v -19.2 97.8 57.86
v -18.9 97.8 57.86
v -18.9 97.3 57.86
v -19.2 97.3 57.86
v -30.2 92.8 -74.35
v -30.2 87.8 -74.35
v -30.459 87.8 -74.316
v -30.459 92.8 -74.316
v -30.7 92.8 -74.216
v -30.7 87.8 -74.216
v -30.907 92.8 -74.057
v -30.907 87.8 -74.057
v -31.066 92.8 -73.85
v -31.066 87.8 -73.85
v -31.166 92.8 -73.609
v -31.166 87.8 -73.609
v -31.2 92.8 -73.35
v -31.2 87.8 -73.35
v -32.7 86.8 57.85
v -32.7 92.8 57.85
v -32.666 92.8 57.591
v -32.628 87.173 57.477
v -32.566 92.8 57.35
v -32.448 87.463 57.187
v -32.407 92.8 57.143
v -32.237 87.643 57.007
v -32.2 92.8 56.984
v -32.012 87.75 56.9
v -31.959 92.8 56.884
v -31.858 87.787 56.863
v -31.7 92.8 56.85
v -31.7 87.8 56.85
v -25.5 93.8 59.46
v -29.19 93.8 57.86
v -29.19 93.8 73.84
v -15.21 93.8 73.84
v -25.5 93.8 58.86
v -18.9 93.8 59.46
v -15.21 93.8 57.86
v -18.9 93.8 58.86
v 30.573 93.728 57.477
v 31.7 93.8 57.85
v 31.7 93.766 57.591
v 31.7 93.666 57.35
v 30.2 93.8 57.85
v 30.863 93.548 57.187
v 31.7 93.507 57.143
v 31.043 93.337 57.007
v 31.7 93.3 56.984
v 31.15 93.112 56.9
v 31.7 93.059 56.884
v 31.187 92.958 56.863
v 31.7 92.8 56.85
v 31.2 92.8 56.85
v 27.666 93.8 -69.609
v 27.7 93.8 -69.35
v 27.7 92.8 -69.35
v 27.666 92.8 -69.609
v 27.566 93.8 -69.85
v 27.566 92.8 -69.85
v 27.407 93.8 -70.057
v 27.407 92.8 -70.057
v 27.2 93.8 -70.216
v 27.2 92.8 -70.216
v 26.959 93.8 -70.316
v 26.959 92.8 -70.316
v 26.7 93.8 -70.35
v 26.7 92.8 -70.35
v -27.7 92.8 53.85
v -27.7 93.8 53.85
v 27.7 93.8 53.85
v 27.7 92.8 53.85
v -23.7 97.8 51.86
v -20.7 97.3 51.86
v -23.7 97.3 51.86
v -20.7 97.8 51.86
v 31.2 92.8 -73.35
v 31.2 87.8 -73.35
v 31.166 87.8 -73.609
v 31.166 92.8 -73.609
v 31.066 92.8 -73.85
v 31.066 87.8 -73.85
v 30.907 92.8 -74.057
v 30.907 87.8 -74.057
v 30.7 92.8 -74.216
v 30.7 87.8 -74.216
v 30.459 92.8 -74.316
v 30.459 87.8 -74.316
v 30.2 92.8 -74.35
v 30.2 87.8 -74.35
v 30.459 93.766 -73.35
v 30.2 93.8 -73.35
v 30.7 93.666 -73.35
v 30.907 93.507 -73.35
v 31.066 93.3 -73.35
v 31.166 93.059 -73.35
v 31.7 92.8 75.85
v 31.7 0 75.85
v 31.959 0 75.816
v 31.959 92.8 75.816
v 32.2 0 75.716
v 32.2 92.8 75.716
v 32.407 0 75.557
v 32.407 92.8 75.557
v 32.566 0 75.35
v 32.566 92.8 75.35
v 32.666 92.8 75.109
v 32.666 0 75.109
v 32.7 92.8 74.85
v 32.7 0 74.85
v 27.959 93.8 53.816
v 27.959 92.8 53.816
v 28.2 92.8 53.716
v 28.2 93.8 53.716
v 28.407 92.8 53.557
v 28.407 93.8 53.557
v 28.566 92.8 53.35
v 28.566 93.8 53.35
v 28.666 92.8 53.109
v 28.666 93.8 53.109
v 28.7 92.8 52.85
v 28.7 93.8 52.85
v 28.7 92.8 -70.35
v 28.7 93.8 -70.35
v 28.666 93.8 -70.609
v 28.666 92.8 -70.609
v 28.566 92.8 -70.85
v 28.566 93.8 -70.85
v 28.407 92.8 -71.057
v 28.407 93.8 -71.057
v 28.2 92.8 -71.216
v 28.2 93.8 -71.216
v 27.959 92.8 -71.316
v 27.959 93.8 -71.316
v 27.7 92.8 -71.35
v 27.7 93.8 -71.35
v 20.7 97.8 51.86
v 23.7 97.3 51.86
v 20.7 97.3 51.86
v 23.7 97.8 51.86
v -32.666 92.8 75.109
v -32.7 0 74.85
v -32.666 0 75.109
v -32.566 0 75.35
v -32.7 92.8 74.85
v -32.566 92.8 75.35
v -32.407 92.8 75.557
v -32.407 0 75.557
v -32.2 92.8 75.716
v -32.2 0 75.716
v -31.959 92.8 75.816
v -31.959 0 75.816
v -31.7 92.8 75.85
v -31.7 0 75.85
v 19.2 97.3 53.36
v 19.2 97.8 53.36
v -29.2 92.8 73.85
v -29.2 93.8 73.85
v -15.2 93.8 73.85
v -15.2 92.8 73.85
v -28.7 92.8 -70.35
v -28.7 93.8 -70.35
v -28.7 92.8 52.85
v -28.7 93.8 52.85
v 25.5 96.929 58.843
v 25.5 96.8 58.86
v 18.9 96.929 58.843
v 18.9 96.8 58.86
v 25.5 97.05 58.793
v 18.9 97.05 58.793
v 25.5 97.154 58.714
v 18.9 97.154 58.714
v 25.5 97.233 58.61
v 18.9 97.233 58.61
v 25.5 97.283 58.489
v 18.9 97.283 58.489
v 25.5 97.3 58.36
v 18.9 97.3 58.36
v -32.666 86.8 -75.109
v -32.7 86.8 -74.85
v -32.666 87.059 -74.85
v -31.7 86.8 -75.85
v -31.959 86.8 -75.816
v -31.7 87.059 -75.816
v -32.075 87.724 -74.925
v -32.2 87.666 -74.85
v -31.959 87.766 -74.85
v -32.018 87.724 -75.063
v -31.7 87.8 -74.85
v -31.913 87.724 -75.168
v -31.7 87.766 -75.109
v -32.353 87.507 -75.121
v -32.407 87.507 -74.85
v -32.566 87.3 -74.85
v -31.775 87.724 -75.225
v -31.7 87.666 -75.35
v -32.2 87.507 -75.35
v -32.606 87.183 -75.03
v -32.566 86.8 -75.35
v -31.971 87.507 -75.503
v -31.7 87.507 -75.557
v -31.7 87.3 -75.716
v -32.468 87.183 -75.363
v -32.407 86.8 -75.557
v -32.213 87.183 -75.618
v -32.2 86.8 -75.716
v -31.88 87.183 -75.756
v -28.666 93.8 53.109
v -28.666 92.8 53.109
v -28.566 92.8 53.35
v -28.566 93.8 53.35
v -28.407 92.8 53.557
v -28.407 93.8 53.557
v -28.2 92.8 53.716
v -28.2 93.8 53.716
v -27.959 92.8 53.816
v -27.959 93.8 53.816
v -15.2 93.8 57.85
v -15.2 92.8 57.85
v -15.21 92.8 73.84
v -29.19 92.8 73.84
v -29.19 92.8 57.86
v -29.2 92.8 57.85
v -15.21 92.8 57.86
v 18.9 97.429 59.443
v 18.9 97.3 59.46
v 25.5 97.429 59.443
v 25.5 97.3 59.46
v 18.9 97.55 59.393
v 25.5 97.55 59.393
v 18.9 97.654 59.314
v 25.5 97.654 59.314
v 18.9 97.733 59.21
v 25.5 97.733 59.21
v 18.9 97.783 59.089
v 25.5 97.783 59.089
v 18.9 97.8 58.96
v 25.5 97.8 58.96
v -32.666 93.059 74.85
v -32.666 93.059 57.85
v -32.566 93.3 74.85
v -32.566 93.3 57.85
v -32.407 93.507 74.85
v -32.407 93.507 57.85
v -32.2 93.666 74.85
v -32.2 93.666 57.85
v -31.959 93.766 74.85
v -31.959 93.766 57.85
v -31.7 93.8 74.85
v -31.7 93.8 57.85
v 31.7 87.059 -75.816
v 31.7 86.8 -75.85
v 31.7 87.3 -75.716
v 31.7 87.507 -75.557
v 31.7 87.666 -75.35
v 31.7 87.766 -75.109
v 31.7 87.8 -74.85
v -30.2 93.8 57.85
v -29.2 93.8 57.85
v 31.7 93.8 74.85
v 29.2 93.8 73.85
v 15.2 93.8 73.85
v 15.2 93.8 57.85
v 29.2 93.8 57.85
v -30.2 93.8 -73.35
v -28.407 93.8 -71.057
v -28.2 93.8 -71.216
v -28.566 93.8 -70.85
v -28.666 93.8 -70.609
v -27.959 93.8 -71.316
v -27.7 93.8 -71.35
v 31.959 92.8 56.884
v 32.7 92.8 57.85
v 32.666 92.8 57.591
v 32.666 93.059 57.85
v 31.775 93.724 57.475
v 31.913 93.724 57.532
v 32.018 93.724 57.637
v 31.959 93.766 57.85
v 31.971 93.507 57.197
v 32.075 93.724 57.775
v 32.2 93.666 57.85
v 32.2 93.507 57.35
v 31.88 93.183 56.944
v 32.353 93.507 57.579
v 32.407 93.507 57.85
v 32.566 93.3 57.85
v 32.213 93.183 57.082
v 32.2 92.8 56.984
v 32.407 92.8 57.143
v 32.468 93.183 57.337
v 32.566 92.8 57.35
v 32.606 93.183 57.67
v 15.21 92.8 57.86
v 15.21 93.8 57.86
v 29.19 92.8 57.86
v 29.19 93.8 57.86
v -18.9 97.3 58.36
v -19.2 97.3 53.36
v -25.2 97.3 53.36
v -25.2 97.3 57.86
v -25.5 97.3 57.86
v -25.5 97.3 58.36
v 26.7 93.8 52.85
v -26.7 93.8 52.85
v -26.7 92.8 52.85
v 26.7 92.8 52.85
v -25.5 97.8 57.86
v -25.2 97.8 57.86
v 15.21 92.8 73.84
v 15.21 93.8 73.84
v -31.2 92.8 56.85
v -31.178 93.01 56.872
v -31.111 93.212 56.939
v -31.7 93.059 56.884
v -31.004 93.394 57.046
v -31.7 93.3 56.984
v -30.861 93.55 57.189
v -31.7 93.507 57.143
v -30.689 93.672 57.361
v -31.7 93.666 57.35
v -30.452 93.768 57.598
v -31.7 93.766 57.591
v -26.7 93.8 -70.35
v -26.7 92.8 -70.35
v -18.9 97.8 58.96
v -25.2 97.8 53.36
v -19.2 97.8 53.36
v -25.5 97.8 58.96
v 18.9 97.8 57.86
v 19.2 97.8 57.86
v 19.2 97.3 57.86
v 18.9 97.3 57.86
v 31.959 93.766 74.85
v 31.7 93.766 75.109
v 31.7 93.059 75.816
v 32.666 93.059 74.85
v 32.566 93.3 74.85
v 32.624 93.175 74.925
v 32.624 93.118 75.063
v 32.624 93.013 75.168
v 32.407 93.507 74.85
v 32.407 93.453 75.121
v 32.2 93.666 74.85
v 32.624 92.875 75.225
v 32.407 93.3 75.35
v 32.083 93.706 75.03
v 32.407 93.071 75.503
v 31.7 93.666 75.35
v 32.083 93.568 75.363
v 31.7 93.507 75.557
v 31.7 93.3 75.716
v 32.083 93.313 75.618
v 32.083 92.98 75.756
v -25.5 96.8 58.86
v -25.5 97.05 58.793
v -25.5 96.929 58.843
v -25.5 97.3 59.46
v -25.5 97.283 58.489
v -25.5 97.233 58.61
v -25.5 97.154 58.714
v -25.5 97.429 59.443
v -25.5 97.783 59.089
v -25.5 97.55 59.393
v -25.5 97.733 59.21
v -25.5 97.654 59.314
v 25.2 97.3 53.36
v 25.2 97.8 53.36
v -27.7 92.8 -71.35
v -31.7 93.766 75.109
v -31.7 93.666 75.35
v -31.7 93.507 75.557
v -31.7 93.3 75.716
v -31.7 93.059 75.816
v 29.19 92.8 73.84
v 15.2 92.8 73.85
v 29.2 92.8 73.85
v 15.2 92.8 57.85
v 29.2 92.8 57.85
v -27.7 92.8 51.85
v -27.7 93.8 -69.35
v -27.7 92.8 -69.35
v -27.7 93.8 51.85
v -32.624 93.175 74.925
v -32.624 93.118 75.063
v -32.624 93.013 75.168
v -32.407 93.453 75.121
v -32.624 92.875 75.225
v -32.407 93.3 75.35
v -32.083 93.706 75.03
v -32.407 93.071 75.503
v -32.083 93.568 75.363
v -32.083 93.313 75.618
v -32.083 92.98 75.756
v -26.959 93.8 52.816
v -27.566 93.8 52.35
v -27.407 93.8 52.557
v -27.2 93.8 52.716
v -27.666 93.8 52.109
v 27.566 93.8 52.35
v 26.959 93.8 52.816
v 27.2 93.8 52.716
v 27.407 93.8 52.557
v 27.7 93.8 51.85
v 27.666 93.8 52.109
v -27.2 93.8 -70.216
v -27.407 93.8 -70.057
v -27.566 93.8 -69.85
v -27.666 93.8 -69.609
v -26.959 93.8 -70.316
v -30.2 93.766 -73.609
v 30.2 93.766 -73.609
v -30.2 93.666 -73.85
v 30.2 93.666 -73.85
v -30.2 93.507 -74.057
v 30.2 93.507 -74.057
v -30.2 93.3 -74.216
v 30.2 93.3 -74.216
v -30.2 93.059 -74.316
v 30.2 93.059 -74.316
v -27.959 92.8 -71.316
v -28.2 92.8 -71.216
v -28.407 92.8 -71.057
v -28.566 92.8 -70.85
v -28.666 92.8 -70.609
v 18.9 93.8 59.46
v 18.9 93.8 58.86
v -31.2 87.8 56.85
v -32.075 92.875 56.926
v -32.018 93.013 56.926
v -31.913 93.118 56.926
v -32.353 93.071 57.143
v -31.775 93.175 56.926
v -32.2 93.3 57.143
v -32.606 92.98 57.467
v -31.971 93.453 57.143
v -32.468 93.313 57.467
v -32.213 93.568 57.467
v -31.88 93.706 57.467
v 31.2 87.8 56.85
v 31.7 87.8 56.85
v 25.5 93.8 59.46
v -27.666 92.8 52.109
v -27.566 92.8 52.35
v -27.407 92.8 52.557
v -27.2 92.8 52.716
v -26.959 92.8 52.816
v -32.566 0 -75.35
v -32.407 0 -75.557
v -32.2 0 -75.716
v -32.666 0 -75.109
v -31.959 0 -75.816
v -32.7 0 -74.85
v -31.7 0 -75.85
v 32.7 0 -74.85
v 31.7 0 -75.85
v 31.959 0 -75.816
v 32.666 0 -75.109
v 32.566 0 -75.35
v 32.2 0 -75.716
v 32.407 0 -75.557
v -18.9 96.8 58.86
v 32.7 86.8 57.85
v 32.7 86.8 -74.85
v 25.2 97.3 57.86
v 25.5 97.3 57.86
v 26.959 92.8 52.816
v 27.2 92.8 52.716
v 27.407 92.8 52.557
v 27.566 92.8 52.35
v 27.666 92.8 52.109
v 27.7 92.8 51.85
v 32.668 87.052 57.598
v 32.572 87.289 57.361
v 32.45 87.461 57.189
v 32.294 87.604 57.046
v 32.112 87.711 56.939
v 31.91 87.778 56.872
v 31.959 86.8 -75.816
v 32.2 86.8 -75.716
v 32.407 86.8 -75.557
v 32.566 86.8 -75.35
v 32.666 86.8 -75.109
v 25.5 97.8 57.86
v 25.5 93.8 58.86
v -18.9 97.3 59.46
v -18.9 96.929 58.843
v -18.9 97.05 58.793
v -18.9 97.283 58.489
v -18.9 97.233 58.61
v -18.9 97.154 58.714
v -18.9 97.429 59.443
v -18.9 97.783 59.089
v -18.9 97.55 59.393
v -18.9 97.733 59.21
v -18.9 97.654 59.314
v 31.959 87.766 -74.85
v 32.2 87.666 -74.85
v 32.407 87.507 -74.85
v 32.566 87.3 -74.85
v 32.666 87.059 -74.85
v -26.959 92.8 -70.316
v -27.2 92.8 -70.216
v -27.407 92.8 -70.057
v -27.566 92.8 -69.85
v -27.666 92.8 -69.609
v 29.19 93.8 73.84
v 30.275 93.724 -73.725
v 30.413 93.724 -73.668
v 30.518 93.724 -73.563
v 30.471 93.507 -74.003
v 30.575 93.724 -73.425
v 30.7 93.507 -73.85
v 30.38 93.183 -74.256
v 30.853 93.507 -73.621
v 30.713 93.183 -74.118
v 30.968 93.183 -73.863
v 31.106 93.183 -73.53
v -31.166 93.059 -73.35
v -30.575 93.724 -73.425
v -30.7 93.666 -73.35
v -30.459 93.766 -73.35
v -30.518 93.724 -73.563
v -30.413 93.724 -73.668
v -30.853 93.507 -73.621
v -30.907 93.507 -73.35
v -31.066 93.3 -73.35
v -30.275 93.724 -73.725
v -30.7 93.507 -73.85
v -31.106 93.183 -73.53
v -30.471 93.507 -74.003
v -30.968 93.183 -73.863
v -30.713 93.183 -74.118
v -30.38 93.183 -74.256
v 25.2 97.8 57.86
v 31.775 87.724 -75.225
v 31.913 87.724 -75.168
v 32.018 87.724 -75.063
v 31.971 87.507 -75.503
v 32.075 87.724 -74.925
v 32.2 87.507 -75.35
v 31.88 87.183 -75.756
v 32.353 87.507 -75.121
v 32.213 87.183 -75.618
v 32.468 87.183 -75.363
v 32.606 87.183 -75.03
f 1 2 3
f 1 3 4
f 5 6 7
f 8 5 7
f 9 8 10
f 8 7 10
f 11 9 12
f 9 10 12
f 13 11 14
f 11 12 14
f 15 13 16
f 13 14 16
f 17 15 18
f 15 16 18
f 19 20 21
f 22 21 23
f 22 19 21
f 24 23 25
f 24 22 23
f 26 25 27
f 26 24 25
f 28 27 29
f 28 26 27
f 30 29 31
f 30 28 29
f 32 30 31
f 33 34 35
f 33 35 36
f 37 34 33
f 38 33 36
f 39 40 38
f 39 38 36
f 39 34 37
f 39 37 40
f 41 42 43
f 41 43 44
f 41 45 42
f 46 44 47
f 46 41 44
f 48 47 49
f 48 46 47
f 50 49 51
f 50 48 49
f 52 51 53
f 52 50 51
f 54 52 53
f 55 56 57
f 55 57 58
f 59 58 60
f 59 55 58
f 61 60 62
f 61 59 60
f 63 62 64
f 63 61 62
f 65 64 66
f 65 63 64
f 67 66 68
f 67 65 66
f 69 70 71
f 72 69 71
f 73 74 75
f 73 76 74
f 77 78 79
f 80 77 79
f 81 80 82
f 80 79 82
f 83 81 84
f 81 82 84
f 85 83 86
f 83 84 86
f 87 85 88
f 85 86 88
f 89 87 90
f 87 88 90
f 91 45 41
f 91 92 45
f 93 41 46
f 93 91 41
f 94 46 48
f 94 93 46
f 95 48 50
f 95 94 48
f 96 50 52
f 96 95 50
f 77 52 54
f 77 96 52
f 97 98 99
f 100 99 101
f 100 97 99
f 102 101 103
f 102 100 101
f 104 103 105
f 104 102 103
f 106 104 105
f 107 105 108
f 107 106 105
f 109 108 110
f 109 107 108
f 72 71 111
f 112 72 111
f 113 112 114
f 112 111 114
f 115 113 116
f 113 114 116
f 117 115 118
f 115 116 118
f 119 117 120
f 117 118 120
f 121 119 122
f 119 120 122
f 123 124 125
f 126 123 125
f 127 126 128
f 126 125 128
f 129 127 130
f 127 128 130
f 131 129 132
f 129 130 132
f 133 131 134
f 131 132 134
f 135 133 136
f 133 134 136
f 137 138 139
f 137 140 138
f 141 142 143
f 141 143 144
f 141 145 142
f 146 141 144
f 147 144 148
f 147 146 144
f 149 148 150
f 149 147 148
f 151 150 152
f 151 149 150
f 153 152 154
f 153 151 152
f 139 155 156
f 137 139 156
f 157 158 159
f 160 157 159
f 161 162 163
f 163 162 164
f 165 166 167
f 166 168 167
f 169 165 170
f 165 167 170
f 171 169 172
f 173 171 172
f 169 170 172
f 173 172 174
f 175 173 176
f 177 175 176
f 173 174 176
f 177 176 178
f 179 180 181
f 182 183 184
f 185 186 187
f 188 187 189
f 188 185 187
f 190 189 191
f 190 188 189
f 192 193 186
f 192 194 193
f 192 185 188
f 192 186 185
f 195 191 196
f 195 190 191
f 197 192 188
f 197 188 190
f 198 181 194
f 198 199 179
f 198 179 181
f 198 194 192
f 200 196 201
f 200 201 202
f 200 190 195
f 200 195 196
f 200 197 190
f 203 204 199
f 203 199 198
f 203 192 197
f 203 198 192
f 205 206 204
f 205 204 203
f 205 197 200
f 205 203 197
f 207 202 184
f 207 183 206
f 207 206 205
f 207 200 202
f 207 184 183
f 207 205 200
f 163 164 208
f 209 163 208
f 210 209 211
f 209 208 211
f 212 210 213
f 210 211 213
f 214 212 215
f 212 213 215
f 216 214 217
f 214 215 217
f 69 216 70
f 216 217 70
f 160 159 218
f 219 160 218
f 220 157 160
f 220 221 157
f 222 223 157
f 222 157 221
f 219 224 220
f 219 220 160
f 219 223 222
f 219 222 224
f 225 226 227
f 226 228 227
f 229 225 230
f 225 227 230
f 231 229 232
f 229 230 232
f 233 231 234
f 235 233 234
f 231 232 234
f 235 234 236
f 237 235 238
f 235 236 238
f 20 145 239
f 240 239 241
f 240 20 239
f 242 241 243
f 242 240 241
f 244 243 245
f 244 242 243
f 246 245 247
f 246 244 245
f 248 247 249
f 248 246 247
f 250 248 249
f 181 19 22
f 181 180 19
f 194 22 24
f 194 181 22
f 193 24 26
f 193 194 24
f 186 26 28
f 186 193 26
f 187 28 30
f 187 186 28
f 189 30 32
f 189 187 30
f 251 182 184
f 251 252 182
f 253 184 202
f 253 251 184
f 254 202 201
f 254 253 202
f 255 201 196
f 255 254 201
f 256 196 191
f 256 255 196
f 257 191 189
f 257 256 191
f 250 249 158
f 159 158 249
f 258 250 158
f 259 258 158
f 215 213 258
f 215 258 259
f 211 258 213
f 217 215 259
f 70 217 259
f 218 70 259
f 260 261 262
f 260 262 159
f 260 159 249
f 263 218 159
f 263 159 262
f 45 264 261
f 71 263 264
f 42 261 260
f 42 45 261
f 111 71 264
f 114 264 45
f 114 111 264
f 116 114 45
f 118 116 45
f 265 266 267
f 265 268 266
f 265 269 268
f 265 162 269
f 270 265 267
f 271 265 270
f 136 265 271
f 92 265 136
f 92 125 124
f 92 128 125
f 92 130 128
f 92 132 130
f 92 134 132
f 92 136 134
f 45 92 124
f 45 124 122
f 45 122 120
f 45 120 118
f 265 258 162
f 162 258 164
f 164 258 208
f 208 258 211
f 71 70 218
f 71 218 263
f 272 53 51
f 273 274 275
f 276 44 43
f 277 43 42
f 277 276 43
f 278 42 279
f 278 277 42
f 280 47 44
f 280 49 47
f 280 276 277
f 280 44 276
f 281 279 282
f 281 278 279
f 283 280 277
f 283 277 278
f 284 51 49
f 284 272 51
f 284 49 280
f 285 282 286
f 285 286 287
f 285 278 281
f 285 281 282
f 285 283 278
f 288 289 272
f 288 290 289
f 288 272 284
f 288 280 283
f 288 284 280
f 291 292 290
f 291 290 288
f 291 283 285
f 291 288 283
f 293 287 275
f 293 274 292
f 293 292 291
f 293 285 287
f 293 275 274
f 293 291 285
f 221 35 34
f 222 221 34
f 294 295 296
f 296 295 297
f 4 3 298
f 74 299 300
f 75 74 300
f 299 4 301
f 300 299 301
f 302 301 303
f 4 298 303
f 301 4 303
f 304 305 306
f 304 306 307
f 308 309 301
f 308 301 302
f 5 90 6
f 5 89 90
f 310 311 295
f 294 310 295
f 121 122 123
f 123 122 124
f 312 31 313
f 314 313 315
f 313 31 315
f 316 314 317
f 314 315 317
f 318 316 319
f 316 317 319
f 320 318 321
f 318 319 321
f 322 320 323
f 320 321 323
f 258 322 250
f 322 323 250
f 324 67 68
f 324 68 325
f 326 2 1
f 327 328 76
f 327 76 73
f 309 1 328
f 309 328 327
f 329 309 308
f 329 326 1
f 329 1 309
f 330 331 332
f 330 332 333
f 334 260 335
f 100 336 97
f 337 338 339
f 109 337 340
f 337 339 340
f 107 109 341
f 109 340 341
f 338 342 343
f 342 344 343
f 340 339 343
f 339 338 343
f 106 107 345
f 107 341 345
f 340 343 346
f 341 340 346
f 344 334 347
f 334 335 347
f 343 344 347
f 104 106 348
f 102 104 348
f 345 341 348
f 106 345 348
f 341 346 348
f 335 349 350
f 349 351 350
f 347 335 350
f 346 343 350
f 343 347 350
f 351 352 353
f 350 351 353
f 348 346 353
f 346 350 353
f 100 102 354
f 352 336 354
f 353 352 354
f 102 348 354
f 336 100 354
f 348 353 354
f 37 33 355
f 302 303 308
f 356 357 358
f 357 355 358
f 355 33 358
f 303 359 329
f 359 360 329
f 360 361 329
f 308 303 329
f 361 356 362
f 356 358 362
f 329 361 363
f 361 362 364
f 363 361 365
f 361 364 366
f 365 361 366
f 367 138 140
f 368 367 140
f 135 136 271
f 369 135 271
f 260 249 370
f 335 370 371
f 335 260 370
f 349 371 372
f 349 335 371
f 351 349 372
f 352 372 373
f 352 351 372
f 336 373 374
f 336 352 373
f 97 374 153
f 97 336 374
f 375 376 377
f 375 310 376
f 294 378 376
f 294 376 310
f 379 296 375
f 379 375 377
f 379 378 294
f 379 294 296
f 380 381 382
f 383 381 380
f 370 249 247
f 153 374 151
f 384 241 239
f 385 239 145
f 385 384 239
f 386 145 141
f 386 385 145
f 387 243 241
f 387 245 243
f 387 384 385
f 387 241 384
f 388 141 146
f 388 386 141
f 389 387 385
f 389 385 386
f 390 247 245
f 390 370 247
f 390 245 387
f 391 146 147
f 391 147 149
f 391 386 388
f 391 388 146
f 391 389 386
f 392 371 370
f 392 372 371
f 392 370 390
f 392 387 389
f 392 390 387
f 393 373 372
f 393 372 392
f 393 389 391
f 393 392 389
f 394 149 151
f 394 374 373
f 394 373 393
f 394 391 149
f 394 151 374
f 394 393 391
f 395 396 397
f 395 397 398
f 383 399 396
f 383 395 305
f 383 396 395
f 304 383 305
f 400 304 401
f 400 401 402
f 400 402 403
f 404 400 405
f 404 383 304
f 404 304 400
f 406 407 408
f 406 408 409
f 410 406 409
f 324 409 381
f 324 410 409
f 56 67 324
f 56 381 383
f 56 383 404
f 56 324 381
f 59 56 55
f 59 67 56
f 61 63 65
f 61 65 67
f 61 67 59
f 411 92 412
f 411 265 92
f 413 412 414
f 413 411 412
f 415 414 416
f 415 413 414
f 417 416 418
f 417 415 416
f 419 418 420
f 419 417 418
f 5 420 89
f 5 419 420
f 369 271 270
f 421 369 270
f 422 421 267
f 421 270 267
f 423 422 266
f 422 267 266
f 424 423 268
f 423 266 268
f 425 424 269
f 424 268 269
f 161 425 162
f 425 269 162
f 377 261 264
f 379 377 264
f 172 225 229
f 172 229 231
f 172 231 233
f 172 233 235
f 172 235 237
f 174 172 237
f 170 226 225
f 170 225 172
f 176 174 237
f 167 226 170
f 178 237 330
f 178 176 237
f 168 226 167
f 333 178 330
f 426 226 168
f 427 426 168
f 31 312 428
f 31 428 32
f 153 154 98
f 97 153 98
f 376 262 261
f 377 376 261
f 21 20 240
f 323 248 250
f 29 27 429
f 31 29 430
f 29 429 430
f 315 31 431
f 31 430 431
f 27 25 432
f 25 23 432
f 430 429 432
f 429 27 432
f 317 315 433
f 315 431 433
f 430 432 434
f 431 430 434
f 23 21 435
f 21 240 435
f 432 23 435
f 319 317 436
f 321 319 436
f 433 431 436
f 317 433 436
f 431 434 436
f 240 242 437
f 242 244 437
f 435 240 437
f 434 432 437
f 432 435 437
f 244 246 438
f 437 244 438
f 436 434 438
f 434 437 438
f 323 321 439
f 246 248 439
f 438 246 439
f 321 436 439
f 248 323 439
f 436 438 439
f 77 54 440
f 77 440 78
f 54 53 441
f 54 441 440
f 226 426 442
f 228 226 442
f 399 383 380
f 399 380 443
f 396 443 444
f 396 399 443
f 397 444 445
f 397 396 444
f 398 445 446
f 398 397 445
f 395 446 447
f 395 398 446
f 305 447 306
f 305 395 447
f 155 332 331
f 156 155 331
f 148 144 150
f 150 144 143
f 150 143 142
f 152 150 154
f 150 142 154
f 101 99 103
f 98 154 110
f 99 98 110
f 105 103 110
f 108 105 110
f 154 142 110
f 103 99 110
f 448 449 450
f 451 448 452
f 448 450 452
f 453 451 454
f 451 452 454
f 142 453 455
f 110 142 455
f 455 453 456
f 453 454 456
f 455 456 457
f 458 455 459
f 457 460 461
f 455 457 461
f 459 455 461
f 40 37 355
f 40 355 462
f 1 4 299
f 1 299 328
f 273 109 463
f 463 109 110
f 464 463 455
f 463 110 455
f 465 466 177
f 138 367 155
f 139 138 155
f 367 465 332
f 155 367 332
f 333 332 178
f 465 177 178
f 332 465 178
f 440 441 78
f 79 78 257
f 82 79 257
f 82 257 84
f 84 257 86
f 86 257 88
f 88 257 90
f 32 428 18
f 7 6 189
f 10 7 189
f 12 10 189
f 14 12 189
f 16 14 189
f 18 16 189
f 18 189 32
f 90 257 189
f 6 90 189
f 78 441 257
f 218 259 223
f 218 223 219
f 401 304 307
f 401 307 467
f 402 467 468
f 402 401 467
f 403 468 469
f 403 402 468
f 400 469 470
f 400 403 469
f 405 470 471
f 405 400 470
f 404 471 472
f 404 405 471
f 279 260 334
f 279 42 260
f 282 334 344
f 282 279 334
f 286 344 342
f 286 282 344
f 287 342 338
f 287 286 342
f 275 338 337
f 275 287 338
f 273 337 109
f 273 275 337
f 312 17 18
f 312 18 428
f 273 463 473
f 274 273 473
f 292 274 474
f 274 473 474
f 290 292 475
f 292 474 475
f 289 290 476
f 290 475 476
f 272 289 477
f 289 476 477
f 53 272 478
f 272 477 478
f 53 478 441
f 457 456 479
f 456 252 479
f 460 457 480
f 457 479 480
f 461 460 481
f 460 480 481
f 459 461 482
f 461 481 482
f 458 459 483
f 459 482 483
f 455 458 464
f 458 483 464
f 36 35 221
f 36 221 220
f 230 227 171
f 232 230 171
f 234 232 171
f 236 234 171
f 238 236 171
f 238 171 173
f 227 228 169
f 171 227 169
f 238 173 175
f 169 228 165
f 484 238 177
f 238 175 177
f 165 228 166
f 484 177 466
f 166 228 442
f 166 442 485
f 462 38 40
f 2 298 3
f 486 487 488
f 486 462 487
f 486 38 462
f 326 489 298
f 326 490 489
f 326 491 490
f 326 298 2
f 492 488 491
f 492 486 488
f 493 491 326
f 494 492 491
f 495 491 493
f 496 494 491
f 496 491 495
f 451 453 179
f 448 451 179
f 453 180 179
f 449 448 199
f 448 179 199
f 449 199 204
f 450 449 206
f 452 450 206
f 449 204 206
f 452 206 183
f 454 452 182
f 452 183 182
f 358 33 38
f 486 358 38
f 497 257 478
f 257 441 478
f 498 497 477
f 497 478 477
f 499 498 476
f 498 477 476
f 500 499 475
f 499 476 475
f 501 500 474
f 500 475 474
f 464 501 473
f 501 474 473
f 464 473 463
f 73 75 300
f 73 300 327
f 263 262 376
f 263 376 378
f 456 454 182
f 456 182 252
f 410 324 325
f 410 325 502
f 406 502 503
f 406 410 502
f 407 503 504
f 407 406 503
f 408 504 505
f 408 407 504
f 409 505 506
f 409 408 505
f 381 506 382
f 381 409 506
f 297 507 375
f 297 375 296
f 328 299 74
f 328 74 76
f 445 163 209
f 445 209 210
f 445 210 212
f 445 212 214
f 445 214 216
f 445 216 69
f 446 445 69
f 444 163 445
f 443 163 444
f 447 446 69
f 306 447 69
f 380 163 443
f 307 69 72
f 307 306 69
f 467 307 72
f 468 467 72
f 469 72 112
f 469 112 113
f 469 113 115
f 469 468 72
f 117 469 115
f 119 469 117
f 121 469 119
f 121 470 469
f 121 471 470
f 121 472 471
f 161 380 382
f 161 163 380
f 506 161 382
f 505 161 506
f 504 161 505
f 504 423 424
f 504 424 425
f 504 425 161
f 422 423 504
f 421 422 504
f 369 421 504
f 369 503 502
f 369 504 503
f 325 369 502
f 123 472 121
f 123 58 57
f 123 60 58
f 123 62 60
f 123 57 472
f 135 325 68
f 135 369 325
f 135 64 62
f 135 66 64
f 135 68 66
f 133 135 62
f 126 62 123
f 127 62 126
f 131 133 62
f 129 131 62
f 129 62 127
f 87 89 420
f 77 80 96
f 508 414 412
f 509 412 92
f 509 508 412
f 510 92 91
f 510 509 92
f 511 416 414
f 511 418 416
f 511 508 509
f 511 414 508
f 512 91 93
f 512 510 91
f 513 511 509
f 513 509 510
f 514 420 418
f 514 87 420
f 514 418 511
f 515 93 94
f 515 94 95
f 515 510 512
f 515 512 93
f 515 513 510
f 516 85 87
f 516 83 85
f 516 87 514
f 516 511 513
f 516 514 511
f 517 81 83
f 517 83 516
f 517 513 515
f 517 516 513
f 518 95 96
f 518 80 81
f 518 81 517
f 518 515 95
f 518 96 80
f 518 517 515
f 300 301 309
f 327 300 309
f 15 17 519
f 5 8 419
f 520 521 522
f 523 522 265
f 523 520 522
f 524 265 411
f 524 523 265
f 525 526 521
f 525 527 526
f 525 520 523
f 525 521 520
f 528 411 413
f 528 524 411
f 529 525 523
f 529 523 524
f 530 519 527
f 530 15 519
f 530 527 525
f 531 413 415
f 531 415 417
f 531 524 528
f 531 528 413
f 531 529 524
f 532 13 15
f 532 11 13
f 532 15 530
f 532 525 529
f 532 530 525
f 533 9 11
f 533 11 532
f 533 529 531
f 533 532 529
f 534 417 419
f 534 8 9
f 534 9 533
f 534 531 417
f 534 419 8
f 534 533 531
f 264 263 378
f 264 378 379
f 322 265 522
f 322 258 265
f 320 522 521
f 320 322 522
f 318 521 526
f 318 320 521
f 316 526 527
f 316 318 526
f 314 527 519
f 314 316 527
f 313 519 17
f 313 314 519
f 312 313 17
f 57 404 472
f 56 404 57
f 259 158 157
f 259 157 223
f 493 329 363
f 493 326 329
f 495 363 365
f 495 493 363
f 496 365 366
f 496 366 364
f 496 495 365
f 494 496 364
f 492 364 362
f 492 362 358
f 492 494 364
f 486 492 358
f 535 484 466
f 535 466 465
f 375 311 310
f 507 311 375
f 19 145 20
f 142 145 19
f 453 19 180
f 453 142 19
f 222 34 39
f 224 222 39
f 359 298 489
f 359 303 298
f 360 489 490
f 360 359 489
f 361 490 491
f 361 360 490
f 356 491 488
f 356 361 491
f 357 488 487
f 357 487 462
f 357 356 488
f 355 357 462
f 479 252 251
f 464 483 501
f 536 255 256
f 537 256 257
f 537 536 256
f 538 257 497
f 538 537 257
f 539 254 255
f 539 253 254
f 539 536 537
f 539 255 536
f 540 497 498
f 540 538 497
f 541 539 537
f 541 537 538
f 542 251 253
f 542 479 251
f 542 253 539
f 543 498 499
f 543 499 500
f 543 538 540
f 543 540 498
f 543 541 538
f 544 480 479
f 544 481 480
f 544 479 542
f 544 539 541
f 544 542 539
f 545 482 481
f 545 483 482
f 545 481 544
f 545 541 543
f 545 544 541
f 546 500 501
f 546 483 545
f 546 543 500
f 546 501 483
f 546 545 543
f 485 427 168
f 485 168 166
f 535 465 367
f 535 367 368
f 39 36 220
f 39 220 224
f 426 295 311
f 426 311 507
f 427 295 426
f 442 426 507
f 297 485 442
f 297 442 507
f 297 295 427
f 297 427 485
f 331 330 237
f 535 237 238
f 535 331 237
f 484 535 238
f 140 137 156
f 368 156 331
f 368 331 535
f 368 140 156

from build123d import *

# Parameters (mm, degrees)
CROQUIS1_W              = 65.4
CROQUIS1_H              = 151.7
SALIENTE_EXTRUIR1_DEPTH = 93.8
CORTAR_EXTRUIR1_DEPTH   = 6
REDONDEO1_R             = 1
CORTAR_EXTRUIR2_DEPTH   = 1
CROQUIS4_W              = 14
CROQUIS4_H              = 16
CROQUIS4_W_2            = 13.98
CROQUIS4_H_2            = 15.98
CORTAR_EXTRUIR3_DEPTH   = 1
CROQUIS5_W              = 6.6
CROQUIS5_H              = 0.6
SALIENTE_EXTRUIR2_DEPTH = 4
CROQUIS6_W              = 6.6
CROQUIS6_H              = 0.5
SALIENTE_EXTRUIR3_DEPTH = 1
CROQUIS7_W              = 6
CROQUIS7_H              = 0.5
SALIENTE_EXTRUIR4_DEPTH = 6
REDONDEO2_R             = 0.5
CHAFL_N1_SIZE           = 1.5


with BuildPart() as part:
    # Croquis1 → Saliente-Extruir1 (new body)
    with BuildSketch(Plane(origin=(0, 0, 0), x_dir=(1, 0, 0), z_dir=(0, 1, 0))):
        Rectangle(CROQUIS1_W, CROQUIS1_H)
    extrude(amount=SALIENTE_EXTRUIR1_DEPTH)

    # Croquis2 → Cortar-Extruir1 (cut)
    with BuildSketch(Plane(origin=(0, 93.8, 0), x_dir=(1, 0, 0), z_dir=(0, 1, 0))):
        Polygon((-32.7, -56.85), (-32.7, 75.85), (32.7, 75.85), (32.7, -56.85), (31.2, -56.85), (31.2, 74.35), (-31.2, 74.35), (-31.2, -56.85), align=None)
    extrude(amount=-CORTAR_EXTRUIR1_DEPTH, mode=Mode.SUBTRACT)

    # Redondeo1
    redondeo1_edges = [part.edges().sort_by_distance(p)[0] for p in [
        (0, 93.8, 75.85),
        (-32.7, 93.8, 66.35),
        (-32.7, 43.9, -75.85),
        (32.7, 43.9, -75.85),
        (-32.7, 87.8, -9.5),
        (-32.7, 90.8, 56.85),
        (0, 87.8, -75.85),
        (32.7, 87.8, -9.5),
        (32.7, 90.8, 56.85),
        (31.2, 90.8, -74.35),
        (-31.2, 90.8, -74.35),
        (-31.95, 93.8, 56.85),
        (-31.2, 93.8, -8.75),
        (0, 93.8, -74.35),
        (31.2, 93.8, -8.75),
        (31.95, 93.8, 56.85),
        (32.7, 93.8, 66.35),
        (32.7, 46.9, 75.85),
        (-32.7, 46.9, 75.85),
    ]]
    fillet(redondeo1_edges, radius=REDONDEO1_R)

    # Croquis3 → Cortar-Extruir2 (cut)
    with BuildSketch(Plane(origin=(0, 93.8, 0), x_dir=(1, 0, 0), z_dir=(0, 1, 0))):
        with BuildLine():
            Line((-27.7, -53.85), (27.7, -53.85))
            ThreePointArc((27.7, -53.85), (28.407106781, -53.557106781), (28.7, -52.85))
            Line((28.7, -52.85), (28.7, 70.35))
            ThreePointArc((28.7, 70.35), (28.407106781, 71.057106781), (27.7, 71.35))
            Line((27.7, 71.35), (-27.7, 71.35))
            ThreePointArc((-27.7, 71.35), (-28.407106781, 71.057106781), (-28.7, 70.35))
            Line((-28.7, 70.35), (-28.7, -52.85))
            ThreePointArc((-28.7, -52.85), (-28.407106781, -53.557106781), (-27.7, -53.85))
        make_face()
        with BuildLine():
            Line((-26.7, -52.85), (26.7, -52.85))
            ThreePointArc((26.7, -52.85), (27.407106781, -52.557106781), (27.7, -51.85))
            Line((27.7, -51.85), (27.7, 69.35))
            ThreePointArc((27.7, 69.35), (27.407106781, 70.057106781), (26.7, 70.35))
            Line((26.7, 70.35), (-26.7, 70.35))
            ThreePointArc((-26.7, 70.35), (-27.407106781, 70.057106781), (-27.7, 69.35))
            Line((-27.7, 69.35), (-27.7, -51.85))
            ThreePointArc((-27.7, -51.85), (-27.407106781, -52.557106781), (-26.7, -52.85))
        make_face(mode=Mode.SUBTRACT)
    extrude(amount=-CORTAR_EXTRUIR2_DEPTH, mode=Mode.SUBTRACT)

    # Croquis4 → Cortar-Extruir3 (cut)
    # profile 1 of 2: a face of its own
    with BuildSketch(Plane(origin=(0, 93.8, 0), x_dir=(1, 0, 0), z_dir=(0, 1, 0))):
        with Locations((-22.2, -65.85)):
            Rectangle(CROQUIS4_W, CROQUIS4_H)
        with Locations((-22.2, -65.85)):
            Rectangle(CROQUIS4_W_2, CROQUIS4_H_2, mode=Mode.SUBTRACT)
    # profile 2 of 2: a face of its own
    with BuildSketch(Plane(origin=(0, 93.8, 0), x_dir=(1, 0, 0), z_dir=(0, 1, 0))):
        with Locations((22.2, -65.85)):
            Rectangle(CROQUIS4_W, CROQUIS4_H)
        with Locations((22.2, -65.85)):
            Rectangle(CROQUIS4_W_2, CROQUIS4_H_2, mode=Mode.SUBTRACT)
    extrude(amount=-CORTAR_EXTRUIR3_DEPTH, mode=Mode.SUBTRACT)

    # Croquis5 → Saliente-Extruir2 (add)
    with BuildSketch(Plane(origin=(0, 93.8, 0), x_dir=(1, 0, 0), z_dir=(0, 1, 0))):
        with Locations((-22.2, -59.16)):
            Rectangle(CROQUIS5_W, CROQUIS5_H)
        with Locations((22.2, -59.16)):
            Rectangle(CROQUIS5_W, CROQUIS5_H)
    extrude(amount=SALIENTE_EXTRUIR2_DEPTH)

    # Croquis6 → Saliente-Extruir3 (add)
    with BuildSketch(Plane(origin=(0, 0, 58.86), x_dir=(-1, 0, 0), z_dir=(0, 0, -1))):
        with Locations((22.2, 97.55)):
            Rectangle(CROQUIS6_W, CROQUIS6_H)
        with Locations((-22.2, 97.55)):
            Rectangle(CROQUIS6_W, CROQUIS6_H)
    extrude(amount=SALIENTE_EXTRUIR3_DEPTH)

    # Croquis7 → Saliente-Extruir4 (add)
    with BuildSketch(Plane(origin=(0, 0, 57.86), x_dir=(-1, 0, 0), z_dir=(0, 0, -1))):
        with Locations((22.2, 97.55)):
            Rectangle(CROQUIS7_W, CROQUIS7_H)
        with Locations((-22.2, 97.55)):
            Rectangle(CROQUIS7_W, CROQUIS7_H)
    extrude(amount=SALIENTE_EXTRUIR4_DEPTH)

    # Redondeo2
    redondeo2_edges = [part.edges().sort_by_distance(p)[0] for p in [
        (-22.2, 97.8, 59.46),
        (22.2, 97.8, 59.46),
        (-22.2, 97.3, 58.86),
        (22.2, 97.3, 58.86),
    ]]
    fillet(redondeo2_edges, radius=REDONDEO2_R)

    # Chaflán1
    chafl_n1_edges = [part.edges().sort_by_distance(p)[0] for p in [
        (-25.2, 97.55, 51.86),
        (-19.2, 97.55, 51.86),
        (25.2, 97.55, 51.86),
        (19.2, 97.55, 51.86),
    ]]
    chamfer(chafl_n1_edges, length=CHAFL_N1_SIZE)


solid = part.part
